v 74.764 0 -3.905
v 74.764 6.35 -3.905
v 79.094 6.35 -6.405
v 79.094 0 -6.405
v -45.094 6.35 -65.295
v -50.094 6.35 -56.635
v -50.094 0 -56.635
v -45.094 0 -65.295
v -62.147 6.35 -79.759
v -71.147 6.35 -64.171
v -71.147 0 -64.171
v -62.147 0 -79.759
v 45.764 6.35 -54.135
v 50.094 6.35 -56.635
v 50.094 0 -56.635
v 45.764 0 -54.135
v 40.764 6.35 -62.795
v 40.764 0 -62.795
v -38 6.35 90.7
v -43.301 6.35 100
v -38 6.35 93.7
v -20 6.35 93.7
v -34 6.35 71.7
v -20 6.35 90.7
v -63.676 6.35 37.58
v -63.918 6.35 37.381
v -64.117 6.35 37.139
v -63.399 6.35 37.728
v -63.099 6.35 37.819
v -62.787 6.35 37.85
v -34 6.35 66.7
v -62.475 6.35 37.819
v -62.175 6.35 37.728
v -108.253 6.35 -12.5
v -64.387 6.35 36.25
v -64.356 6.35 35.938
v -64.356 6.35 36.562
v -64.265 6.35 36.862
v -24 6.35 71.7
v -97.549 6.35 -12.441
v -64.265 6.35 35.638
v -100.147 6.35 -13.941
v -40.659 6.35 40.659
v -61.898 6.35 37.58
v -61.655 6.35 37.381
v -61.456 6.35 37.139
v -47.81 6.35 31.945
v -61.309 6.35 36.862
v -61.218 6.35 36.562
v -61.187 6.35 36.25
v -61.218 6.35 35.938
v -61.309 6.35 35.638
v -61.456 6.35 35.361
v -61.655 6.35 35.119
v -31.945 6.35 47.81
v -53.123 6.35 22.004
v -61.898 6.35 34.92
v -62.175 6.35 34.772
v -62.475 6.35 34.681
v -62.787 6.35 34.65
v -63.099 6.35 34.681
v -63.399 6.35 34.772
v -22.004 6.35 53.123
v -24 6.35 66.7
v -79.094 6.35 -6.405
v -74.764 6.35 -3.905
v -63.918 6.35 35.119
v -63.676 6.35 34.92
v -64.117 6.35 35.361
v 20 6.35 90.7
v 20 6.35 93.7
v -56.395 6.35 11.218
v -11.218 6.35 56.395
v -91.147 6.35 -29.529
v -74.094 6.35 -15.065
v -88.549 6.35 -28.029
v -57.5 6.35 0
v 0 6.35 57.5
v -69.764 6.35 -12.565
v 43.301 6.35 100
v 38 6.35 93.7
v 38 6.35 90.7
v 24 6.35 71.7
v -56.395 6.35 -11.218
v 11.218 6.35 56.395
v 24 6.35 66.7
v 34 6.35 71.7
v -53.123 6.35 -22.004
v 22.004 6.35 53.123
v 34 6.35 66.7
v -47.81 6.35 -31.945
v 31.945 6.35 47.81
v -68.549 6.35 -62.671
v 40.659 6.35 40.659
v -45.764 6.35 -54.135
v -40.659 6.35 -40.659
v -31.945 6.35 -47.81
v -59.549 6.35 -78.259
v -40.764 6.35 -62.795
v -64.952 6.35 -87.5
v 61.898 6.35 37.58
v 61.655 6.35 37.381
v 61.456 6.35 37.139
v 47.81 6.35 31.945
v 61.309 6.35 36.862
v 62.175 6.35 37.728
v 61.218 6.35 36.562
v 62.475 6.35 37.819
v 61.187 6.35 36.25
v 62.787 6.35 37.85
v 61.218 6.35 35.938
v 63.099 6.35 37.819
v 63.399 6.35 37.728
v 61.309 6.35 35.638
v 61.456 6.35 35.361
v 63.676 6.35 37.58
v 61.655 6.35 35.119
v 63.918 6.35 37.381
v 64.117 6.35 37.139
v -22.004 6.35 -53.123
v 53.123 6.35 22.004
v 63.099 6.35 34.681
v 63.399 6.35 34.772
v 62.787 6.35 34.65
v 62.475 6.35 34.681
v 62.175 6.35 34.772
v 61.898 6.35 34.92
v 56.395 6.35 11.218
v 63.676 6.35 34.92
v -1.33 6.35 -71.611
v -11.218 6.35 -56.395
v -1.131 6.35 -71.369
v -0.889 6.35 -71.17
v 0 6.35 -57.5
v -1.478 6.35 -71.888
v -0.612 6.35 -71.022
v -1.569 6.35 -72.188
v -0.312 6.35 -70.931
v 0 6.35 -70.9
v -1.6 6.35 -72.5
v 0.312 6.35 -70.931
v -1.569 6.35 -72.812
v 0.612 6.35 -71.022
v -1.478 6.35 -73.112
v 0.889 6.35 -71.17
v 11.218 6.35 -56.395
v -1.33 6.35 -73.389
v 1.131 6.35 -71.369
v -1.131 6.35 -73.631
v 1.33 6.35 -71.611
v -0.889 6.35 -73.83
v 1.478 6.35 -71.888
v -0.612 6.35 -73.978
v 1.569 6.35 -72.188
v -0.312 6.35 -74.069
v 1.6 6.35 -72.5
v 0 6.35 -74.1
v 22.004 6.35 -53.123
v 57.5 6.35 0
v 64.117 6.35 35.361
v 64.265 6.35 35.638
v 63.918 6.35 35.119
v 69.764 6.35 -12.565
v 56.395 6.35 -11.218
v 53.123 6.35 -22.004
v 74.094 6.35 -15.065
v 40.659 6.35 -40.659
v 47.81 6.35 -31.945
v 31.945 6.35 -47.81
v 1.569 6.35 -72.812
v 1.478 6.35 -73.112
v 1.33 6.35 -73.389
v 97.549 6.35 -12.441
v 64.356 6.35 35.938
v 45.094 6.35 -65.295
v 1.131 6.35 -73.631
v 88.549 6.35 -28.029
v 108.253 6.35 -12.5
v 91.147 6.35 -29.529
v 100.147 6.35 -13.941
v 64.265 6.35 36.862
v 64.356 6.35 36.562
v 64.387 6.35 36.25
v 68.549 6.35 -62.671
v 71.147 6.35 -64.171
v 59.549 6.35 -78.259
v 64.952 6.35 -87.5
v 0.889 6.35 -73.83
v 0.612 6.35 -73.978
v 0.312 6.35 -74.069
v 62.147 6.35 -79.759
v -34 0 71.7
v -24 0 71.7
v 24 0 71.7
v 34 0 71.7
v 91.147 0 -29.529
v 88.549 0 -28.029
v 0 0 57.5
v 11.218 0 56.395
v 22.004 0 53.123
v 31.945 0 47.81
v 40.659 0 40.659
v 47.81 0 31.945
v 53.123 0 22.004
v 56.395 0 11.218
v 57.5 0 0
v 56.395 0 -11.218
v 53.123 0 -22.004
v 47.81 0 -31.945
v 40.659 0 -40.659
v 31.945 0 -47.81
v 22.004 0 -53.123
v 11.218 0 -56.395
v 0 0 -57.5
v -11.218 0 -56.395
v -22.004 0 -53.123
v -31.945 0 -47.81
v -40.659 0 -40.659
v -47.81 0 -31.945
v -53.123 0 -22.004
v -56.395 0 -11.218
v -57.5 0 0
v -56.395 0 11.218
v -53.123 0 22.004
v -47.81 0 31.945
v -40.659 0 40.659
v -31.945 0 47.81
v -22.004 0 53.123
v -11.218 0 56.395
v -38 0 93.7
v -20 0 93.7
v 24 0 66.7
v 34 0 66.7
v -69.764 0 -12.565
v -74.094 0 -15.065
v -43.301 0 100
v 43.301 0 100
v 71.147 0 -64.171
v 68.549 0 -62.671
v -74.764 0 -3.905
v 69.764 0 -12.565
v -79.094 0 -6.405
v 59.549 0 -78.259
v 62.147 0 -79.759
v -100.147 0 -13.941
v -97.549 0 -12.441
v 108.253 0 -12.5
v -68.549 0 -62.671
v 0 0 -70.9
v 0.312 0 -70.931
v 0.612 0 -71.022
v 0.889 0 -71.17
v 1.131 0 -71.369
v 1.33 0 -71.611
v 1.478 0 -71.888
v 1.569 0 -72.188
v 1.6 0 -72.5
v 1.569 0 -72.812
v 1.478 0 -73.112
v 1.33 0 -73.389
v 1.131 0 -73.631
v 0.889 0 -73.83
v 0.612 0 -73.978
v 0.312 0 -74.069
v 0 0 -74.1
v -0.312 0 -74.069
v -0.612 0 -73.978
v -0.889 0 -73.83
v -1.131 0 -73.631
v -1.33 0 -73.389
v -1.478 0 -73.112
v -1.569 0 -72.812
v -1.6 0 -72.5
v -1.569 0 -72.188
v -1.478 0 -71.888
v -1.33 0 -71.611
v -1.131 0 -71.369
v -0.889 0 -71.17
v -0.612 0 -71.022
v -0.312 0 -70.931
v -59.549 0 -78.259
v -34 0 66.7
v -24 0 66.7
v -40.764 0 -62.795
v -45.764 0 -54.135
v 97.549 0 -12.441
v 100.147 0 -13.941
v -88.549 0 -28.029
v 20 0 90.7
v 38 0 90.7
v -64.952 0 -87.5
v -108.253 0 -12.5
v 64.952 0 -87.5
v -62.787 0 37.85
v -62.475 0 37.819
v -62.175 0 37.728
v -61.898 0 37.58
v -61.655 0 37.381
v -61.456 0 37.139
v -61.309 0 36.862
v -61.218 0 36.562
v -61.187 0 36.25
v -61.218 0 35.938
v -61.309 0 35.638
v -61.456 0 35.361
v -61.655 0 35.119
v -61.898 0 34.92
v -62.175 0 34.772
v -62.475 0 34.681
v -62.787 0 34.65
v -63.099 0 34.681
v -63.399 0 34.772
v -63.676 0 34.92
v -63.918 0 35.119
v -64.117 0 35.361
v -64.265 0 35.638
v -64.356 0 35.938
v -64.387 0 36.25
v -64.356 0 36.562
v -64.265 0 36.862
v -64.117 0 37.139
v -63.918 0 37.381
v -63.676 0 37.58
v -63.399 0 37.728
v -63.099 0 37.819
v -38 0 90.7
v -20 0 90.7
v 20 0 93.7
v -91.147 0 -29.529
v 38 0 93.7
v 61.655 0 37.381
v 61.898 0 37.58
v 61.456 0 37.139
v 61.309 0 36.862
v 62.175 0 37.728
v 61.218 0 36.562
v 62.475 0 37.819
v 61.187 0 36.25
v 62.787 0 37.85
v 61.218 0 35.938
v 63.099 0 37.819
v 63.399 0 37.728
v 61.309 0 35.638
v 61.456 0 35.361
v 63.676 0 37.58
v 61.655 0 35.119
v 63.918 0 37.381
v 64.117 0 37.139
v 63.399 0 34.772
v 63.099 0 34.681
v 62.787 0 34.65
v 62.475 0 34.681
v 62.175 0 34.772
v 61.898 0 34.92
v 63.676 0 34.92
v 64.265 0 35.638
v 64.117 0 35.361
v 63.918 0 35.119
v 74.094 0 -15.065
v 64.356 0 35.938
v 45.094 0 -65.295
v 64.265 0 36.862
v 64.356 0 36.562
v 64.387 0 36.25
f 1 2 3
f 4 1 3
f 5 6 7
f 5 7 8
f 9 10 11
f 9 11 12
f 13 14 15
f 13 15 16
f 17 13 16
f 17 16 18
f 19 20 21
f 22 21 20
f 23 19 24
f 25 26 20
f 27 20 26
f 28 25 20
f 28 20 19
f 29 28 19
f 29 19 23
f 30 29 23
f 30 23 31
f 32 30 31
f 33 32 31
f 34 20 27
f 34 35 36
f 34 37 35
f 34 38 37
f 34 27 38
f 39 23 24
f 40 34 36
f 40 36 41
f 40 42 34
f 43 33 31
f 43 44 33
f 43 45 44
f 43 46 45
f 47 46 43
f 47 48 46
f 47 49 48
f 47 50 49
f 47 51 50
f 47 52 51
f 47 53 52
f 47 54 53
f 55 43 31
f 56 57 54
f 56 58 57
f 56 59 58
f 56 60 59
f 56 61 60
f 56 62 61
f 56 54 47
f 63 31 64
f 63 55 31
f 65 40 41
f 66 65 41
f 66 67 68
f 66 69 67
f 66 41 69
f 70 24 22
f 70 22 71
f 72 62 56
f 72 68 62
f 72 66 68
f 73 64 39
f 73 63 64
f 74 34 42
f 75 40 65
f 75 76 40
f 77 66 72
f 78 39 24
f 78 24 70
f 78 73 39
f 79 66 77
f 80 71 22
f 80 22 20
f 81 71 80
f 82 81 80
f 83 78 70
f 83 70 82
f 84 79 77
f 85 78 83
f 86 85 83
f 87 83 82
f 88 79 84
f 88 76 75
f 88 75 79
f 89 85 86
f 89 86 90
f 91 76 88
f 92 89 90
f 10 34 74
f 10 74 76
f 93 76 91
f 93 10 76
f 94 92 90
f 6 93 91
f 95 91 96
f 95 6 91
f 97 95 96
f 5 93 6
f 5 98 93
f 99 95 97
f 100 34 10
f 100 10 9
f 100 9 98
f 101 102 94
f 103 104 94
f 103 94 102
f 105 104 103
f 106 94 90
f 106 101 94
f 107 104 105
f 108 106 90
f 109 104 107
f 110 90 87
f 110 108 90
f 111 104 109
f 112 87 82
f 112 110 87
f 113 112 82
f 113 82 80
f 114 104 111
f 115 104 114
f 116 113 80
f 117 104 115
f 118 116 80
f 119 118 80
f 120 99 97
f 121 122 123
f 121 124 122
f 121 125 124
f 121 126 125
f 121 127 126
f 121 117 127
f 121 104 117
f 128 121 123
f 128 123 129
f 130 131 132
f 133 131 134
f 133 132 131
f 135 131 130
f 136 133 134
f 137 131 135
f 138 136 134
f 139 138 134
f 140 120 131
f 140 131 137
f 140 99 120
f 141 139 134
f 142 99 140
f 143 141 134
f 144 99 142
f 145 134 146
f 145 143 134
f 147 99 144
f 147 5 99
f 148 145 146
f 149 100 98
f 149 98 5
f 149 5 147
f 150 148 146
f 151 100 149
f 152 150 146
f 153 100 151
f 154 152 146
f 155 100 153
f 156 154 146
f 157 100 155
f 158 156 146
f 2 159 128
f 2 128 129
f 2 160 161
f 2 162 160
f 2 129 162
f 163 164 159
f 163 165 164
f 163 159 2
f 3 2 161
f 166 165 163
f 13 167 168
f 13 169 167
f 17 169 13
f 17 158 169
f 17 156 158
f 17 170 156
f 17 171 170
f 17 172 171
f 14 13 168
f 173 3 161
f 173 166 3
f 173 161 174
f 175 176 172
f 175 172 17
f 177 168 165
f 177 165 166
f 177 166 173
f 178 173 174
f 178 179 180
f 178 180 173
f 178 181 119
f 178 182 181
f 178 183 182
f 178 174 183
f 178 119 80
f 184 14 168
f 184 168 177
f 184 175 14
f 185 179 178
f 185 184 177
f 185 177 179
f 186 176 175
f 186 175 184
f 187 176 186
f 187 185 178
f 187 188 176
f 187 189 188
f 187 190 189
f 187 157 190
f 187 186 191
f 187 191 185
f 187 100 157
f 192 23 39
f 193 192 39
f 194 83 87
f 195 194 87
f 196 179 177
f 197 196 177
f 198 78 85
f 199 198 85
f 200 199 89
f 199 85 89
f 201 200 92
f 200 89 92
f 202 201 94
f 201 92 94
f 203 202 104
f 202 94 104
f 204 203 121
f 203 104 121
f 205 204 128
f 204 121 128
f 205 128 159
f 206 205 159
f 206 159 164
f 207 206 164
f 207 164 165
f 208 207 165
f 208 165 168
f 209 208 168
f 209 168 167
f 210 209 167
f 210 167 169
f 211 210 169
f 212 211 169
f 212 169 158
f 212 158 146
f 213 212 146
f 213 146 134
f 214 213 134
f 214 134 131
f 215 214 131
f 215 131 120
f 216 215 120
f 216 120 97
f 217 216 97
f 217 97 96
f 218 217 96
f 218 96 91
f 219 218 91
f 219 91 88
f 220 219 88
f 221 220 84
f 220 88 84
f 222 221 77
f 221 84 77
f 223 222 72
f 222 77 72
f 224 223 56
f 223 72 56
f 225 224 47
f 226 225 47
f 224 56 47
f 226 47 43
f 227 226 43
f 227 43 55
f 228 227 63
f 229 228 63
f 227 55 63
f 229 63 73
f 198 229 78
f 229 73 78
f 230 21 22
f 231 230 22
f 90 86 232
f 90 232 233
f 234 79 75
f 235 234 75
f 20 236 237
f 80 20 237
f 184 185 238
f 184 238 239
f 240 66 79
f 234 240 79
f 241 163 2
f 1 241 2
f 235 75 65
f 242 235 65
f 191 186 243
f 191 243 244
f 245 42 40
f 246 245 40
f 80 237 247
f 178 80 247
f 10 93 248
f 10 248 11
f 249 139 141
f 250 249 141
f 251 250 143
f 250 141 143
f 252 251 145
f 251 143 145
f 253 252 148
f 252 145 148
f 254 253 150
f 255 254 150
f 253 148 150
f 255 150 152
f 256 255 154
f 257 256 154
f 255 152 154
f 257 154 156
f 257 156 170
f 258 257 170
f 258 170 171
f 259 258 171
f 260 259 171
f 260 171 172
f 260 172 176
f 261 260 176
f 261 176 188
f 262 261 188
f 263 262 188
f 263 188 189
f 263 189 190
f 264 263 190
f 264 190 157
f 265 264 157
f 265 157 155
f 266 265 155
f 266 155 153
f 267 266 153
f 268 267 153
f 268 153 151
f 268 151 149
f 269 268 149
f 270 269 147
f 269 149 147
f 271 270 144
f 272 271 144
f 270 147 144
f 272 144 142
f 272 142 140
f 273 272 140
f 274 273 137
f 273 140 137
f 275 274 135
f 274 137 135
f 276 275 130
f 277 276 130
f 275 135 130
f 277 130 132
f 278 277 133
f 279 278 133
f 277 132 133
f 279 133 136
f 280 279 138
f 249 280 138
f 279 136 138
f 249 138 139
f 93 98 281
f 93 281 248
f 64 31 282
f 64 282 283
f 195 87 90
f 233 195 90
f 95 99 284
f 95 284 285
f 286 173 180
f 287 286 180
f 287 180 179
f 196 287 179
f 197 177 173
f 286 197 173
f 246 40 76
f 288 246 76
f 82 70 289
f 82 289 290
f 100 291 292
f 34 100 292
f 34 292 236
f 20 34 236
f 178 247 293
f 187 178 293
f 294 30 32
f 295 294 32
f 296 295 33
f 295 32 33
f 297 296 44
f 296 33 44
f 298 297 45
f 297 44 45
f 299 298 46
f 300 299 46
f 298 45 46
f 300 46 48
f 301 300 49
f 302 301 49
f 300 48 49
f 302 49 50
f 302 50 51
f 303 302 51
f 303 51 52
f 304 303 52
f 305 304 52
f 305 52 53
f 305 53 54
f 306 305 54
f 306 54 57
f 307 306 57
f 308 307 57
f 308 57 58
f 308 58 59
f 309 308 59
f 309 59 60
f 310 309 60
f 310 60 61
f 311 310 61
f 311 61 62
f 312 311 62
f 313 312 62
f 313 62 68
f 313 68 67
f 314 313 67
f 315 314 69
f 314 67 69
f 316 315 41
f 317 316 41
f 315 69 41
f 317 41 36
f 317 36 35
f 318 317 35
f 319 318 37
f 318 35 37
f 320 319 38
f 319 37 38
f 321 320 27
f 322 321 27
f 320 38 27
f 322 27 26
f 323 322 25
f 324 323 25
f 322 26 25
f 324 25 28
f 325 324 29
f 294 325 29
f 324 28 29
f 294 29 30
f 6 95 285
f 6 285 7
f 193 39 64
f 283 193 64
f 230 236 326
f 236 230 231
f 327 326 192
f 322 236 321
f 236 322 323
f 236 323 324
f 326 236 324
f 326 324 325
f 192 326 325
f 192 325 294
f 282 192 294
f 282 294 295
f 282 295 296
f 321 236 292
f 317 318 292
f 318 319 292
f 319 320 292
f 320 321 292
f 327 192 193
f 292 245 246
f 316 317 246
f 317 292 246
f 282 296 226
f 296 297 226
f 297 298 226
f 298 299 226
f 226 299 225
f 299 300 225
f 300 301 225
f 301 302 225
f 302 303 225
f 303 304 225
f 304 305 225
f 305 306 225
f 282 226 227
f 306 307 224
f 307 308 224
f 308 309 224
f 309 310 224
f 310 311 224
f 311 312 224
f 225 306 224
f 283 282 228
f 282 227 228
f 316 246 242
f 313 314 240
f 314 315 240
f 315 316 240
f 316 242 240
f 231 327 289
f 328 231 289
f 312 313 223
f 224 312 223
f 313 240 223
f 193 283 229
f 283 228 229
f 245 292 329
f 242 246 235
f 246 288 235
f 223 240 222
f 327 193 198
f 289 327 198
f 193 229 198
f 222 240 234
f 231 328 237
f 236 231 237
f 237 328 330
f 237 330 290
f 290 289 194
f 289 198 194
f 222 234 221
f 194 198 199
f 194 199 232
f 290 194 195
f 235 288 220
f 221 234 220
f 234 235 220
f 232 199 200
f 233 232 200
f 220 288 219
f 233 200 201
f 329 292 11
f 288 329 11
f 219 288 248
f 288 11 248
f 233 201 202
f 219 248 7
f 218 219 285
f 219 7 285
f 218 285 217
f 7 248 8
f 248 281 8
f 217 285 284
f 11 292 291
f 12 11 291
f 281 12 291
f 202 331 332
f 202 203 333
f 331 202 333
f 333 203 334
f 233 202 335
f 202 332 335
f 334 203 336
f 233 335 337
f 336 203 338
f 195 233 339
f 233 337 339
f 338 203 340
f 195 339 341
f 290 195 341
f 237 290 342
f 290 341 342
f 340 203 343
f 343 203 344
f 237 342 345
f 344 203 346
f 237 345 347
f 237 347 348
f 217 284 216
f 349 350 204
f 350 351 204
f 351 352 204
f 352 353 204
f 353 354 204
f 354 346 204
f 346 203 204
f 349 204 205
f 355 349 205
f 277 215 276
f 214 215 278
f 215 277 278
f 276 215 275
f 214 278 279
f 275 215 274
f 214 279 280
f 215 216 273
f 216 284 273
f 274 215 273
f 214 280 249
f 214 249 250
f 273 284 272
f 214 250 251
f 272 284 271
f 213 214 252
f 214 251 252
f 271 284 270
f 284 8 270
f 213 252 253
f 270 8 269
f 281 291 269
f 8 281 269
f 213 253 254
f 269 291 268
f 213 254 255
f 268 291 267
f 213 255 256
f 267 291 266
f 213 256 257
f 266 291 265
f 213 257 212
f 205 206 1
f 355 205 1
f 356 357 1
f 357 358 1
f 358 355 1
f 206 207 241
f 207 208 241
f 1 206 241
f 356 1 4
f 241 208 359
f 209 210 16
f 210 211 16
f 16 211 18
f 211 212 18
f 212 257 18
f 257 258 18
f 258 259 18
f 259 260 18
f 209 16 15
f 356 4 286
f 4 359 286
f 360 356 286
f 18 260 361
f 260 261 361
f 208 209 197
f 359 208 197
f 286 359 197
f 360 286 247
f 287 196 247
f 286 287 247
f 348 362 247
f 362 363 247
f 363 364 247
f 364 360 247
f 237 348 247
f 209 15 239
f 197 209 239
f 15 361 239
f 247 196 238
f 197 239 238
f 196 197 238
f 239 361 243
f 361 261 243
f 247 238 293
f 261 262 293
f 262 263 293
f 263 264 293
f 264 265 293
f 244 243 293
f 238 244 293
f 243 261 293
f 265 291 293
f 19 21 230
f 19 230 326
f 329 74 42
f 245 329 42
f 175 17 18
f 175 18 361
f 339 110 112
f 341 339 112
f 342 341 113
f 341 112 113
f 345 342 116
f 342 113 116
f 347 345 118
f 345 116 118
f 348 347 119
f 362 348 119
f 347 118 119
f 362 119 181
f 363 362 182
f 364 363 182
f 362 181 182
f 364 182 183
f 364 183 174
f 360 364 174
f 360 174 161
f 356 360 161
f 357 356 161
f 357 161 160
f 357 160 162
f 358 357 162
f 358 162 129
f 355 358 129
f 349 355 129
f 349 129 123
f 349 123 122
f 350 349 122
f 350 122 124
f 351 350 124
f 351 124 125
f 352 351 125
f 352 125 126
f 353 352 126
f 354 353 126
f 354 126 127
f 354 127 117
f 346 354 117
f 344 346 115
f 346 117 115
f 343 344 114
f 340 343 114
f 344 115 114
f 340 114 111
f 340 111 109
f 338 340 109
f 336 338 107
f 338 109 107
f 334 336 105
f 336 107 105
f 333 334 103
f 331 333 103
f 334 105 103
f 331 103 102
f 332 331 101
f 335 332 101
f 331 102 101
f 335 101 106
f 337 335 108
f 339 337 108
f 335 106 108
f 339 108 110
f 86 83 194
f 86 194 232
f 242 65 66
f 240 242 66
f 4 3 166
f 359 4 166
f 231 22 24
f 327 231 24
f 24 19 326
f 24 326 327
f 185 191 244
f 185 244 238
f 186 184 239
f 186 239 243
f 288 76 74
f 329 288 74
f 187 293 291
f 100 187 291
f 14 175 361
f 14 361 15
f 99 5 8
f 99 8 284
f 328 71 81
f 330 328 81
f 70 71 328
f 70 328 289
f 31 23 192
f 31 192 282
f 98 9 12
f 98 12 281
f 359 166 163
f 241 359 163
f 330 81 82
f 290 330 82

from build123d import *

# Parameters (mm, degrees)
BOSS_EXTRUDE1_DEPTH = 6.35
SKETCH2_W           = 18
SKETCH2_H           = 3
SKETCH2_W_2         = 10
SKETCH2_H_2         = 5
CUT_EXTRUDE1_DEPTH  = 148.509567486
SKETCH4_R           = 57.5
CUT_EXTRUDE2_DEPTH  = 148.509567486
SKETCH5_R           = 1.6
CUT_EXTRUDE3_DEPTH  = 148.509567486


with BuildPart() as part:
    # Sketch1 → Boss-Extrude1 (new body)
    with BuildSketch(Plane(origin=(0, 0, 0), x_dir=(1, 0, 0), z_dir=(0, 1, 0))):
        Polygon((64.951905284, 87.5), (-64.951905284, 87.5), (-108.253175473, 12.5), (-43.301270189, -100), (43.301270189, -100), (108.253175473, 12.5), align=None)
    extrude(amount=BOSS_EXTRUDE1_DEPTH)

    # Sketch2 → Cut-Extrude1 (cut, through all)
    with BuildSketch(Plane(origin=(0, 6.35, 0), x_dir=(1, 0, 0), z_dir=(0, 1, 0))):
        with Locations((-29, -92.2)):
            Rectangle(SKETCH2_W, SKETCH2_H)
        with Locations((29, -92.2)):
            Rectangle(SKETCH2_W, SKETCH2_H)
        Polygon((-62.146580335, 79.758965344), (-59.548504123, 78.258965344), (-68.548504123, 62.670508076), (-71.146580335, 64.170508076), align=None)
        Polygon((-97.548504123, 12.441034656), (-88.548504123, 28.029491924), (-91.146580335, 29.529491924), (-100.146580335, 13.941034656), align=None)
        Polygon((100.146580335, 13.941034656), (91.146580335, 29.529491924), (88.548504123, 28.029491924), (97.548504123, 12.441034656), align=None)
        Polygon((59.548504123, 78.258965344), (62.146580335, 79.758965344), (71.146580335, 64.170508076), (68.548504123, 62.670508076), align=None)
        with Locations((-29, -69.2)):
            Rectangle(SKETCH2_W_2, SKETCH2_H_2)
        with Locations((29, -69.2)):
            Rectangle(SKETCH2_W_2, SKETCH2_H_2)
        Polygon((79.094021451, 6.405136271), (74.094021451, 15.065390309), (69.763894432, 12.565390309), (74.763894432, 3.905136271), align=None)
        Polygon((40.763894432, 62.794863729), (45.094021451, 65.294863729), (50.094021451, 56.634609691), (45.763894432, 54.134609691), align=None)
        Polygon((-74.763894432, 3.905136271), (-69.763894432, 12.565390309), (-74.094021451, 15.065390309), (-79.094021451, 6.405136271), align=None)
        Polygon((-45.094021451, 65.294863729), (-40.763894432, 62.794863729), (-45.763894432, 54.134609691), (-50.094021451, 56.634609691), align=None)
    extrude(amount=-CUT_EXTRUDE1_DEPTH, mode=Mode.SUBTRACT)

    # Sketch4 → Cut-Extrude2 (cut, through all)
    with BuildSketch(Plane(origin=(0, 6.35, 0), x_dir=(1, 0, 0), z_dir=(0, 1, 0))):
        Circle(SKETCH4_R)
    extrude(amount=-CUT_EXTRUDE2_DEPTH, mode=Mode.SUBTRACT)

    # Sketch5 → Cut-Extrude3 (cut, through all)
    with BuildSketch(Plane(origin=(0, 6.35, 0), x_dir=(1, 0, 0), z_dir=(0, 1, 0))):
        with Locations((0, 72.5)):
            Circle(SKETCH5_R)
        with Locations((-62.786841774, -36.25)):
            Circle(SKETCH5_R)
        with Locations((62.786841774, -36.25)):
            Circle(SKETCH5_R)
    extrude(amount=-CUT_EXTRUDE3_DEPTH, mode=Mode.SUBTRACT)


solid = part.part
